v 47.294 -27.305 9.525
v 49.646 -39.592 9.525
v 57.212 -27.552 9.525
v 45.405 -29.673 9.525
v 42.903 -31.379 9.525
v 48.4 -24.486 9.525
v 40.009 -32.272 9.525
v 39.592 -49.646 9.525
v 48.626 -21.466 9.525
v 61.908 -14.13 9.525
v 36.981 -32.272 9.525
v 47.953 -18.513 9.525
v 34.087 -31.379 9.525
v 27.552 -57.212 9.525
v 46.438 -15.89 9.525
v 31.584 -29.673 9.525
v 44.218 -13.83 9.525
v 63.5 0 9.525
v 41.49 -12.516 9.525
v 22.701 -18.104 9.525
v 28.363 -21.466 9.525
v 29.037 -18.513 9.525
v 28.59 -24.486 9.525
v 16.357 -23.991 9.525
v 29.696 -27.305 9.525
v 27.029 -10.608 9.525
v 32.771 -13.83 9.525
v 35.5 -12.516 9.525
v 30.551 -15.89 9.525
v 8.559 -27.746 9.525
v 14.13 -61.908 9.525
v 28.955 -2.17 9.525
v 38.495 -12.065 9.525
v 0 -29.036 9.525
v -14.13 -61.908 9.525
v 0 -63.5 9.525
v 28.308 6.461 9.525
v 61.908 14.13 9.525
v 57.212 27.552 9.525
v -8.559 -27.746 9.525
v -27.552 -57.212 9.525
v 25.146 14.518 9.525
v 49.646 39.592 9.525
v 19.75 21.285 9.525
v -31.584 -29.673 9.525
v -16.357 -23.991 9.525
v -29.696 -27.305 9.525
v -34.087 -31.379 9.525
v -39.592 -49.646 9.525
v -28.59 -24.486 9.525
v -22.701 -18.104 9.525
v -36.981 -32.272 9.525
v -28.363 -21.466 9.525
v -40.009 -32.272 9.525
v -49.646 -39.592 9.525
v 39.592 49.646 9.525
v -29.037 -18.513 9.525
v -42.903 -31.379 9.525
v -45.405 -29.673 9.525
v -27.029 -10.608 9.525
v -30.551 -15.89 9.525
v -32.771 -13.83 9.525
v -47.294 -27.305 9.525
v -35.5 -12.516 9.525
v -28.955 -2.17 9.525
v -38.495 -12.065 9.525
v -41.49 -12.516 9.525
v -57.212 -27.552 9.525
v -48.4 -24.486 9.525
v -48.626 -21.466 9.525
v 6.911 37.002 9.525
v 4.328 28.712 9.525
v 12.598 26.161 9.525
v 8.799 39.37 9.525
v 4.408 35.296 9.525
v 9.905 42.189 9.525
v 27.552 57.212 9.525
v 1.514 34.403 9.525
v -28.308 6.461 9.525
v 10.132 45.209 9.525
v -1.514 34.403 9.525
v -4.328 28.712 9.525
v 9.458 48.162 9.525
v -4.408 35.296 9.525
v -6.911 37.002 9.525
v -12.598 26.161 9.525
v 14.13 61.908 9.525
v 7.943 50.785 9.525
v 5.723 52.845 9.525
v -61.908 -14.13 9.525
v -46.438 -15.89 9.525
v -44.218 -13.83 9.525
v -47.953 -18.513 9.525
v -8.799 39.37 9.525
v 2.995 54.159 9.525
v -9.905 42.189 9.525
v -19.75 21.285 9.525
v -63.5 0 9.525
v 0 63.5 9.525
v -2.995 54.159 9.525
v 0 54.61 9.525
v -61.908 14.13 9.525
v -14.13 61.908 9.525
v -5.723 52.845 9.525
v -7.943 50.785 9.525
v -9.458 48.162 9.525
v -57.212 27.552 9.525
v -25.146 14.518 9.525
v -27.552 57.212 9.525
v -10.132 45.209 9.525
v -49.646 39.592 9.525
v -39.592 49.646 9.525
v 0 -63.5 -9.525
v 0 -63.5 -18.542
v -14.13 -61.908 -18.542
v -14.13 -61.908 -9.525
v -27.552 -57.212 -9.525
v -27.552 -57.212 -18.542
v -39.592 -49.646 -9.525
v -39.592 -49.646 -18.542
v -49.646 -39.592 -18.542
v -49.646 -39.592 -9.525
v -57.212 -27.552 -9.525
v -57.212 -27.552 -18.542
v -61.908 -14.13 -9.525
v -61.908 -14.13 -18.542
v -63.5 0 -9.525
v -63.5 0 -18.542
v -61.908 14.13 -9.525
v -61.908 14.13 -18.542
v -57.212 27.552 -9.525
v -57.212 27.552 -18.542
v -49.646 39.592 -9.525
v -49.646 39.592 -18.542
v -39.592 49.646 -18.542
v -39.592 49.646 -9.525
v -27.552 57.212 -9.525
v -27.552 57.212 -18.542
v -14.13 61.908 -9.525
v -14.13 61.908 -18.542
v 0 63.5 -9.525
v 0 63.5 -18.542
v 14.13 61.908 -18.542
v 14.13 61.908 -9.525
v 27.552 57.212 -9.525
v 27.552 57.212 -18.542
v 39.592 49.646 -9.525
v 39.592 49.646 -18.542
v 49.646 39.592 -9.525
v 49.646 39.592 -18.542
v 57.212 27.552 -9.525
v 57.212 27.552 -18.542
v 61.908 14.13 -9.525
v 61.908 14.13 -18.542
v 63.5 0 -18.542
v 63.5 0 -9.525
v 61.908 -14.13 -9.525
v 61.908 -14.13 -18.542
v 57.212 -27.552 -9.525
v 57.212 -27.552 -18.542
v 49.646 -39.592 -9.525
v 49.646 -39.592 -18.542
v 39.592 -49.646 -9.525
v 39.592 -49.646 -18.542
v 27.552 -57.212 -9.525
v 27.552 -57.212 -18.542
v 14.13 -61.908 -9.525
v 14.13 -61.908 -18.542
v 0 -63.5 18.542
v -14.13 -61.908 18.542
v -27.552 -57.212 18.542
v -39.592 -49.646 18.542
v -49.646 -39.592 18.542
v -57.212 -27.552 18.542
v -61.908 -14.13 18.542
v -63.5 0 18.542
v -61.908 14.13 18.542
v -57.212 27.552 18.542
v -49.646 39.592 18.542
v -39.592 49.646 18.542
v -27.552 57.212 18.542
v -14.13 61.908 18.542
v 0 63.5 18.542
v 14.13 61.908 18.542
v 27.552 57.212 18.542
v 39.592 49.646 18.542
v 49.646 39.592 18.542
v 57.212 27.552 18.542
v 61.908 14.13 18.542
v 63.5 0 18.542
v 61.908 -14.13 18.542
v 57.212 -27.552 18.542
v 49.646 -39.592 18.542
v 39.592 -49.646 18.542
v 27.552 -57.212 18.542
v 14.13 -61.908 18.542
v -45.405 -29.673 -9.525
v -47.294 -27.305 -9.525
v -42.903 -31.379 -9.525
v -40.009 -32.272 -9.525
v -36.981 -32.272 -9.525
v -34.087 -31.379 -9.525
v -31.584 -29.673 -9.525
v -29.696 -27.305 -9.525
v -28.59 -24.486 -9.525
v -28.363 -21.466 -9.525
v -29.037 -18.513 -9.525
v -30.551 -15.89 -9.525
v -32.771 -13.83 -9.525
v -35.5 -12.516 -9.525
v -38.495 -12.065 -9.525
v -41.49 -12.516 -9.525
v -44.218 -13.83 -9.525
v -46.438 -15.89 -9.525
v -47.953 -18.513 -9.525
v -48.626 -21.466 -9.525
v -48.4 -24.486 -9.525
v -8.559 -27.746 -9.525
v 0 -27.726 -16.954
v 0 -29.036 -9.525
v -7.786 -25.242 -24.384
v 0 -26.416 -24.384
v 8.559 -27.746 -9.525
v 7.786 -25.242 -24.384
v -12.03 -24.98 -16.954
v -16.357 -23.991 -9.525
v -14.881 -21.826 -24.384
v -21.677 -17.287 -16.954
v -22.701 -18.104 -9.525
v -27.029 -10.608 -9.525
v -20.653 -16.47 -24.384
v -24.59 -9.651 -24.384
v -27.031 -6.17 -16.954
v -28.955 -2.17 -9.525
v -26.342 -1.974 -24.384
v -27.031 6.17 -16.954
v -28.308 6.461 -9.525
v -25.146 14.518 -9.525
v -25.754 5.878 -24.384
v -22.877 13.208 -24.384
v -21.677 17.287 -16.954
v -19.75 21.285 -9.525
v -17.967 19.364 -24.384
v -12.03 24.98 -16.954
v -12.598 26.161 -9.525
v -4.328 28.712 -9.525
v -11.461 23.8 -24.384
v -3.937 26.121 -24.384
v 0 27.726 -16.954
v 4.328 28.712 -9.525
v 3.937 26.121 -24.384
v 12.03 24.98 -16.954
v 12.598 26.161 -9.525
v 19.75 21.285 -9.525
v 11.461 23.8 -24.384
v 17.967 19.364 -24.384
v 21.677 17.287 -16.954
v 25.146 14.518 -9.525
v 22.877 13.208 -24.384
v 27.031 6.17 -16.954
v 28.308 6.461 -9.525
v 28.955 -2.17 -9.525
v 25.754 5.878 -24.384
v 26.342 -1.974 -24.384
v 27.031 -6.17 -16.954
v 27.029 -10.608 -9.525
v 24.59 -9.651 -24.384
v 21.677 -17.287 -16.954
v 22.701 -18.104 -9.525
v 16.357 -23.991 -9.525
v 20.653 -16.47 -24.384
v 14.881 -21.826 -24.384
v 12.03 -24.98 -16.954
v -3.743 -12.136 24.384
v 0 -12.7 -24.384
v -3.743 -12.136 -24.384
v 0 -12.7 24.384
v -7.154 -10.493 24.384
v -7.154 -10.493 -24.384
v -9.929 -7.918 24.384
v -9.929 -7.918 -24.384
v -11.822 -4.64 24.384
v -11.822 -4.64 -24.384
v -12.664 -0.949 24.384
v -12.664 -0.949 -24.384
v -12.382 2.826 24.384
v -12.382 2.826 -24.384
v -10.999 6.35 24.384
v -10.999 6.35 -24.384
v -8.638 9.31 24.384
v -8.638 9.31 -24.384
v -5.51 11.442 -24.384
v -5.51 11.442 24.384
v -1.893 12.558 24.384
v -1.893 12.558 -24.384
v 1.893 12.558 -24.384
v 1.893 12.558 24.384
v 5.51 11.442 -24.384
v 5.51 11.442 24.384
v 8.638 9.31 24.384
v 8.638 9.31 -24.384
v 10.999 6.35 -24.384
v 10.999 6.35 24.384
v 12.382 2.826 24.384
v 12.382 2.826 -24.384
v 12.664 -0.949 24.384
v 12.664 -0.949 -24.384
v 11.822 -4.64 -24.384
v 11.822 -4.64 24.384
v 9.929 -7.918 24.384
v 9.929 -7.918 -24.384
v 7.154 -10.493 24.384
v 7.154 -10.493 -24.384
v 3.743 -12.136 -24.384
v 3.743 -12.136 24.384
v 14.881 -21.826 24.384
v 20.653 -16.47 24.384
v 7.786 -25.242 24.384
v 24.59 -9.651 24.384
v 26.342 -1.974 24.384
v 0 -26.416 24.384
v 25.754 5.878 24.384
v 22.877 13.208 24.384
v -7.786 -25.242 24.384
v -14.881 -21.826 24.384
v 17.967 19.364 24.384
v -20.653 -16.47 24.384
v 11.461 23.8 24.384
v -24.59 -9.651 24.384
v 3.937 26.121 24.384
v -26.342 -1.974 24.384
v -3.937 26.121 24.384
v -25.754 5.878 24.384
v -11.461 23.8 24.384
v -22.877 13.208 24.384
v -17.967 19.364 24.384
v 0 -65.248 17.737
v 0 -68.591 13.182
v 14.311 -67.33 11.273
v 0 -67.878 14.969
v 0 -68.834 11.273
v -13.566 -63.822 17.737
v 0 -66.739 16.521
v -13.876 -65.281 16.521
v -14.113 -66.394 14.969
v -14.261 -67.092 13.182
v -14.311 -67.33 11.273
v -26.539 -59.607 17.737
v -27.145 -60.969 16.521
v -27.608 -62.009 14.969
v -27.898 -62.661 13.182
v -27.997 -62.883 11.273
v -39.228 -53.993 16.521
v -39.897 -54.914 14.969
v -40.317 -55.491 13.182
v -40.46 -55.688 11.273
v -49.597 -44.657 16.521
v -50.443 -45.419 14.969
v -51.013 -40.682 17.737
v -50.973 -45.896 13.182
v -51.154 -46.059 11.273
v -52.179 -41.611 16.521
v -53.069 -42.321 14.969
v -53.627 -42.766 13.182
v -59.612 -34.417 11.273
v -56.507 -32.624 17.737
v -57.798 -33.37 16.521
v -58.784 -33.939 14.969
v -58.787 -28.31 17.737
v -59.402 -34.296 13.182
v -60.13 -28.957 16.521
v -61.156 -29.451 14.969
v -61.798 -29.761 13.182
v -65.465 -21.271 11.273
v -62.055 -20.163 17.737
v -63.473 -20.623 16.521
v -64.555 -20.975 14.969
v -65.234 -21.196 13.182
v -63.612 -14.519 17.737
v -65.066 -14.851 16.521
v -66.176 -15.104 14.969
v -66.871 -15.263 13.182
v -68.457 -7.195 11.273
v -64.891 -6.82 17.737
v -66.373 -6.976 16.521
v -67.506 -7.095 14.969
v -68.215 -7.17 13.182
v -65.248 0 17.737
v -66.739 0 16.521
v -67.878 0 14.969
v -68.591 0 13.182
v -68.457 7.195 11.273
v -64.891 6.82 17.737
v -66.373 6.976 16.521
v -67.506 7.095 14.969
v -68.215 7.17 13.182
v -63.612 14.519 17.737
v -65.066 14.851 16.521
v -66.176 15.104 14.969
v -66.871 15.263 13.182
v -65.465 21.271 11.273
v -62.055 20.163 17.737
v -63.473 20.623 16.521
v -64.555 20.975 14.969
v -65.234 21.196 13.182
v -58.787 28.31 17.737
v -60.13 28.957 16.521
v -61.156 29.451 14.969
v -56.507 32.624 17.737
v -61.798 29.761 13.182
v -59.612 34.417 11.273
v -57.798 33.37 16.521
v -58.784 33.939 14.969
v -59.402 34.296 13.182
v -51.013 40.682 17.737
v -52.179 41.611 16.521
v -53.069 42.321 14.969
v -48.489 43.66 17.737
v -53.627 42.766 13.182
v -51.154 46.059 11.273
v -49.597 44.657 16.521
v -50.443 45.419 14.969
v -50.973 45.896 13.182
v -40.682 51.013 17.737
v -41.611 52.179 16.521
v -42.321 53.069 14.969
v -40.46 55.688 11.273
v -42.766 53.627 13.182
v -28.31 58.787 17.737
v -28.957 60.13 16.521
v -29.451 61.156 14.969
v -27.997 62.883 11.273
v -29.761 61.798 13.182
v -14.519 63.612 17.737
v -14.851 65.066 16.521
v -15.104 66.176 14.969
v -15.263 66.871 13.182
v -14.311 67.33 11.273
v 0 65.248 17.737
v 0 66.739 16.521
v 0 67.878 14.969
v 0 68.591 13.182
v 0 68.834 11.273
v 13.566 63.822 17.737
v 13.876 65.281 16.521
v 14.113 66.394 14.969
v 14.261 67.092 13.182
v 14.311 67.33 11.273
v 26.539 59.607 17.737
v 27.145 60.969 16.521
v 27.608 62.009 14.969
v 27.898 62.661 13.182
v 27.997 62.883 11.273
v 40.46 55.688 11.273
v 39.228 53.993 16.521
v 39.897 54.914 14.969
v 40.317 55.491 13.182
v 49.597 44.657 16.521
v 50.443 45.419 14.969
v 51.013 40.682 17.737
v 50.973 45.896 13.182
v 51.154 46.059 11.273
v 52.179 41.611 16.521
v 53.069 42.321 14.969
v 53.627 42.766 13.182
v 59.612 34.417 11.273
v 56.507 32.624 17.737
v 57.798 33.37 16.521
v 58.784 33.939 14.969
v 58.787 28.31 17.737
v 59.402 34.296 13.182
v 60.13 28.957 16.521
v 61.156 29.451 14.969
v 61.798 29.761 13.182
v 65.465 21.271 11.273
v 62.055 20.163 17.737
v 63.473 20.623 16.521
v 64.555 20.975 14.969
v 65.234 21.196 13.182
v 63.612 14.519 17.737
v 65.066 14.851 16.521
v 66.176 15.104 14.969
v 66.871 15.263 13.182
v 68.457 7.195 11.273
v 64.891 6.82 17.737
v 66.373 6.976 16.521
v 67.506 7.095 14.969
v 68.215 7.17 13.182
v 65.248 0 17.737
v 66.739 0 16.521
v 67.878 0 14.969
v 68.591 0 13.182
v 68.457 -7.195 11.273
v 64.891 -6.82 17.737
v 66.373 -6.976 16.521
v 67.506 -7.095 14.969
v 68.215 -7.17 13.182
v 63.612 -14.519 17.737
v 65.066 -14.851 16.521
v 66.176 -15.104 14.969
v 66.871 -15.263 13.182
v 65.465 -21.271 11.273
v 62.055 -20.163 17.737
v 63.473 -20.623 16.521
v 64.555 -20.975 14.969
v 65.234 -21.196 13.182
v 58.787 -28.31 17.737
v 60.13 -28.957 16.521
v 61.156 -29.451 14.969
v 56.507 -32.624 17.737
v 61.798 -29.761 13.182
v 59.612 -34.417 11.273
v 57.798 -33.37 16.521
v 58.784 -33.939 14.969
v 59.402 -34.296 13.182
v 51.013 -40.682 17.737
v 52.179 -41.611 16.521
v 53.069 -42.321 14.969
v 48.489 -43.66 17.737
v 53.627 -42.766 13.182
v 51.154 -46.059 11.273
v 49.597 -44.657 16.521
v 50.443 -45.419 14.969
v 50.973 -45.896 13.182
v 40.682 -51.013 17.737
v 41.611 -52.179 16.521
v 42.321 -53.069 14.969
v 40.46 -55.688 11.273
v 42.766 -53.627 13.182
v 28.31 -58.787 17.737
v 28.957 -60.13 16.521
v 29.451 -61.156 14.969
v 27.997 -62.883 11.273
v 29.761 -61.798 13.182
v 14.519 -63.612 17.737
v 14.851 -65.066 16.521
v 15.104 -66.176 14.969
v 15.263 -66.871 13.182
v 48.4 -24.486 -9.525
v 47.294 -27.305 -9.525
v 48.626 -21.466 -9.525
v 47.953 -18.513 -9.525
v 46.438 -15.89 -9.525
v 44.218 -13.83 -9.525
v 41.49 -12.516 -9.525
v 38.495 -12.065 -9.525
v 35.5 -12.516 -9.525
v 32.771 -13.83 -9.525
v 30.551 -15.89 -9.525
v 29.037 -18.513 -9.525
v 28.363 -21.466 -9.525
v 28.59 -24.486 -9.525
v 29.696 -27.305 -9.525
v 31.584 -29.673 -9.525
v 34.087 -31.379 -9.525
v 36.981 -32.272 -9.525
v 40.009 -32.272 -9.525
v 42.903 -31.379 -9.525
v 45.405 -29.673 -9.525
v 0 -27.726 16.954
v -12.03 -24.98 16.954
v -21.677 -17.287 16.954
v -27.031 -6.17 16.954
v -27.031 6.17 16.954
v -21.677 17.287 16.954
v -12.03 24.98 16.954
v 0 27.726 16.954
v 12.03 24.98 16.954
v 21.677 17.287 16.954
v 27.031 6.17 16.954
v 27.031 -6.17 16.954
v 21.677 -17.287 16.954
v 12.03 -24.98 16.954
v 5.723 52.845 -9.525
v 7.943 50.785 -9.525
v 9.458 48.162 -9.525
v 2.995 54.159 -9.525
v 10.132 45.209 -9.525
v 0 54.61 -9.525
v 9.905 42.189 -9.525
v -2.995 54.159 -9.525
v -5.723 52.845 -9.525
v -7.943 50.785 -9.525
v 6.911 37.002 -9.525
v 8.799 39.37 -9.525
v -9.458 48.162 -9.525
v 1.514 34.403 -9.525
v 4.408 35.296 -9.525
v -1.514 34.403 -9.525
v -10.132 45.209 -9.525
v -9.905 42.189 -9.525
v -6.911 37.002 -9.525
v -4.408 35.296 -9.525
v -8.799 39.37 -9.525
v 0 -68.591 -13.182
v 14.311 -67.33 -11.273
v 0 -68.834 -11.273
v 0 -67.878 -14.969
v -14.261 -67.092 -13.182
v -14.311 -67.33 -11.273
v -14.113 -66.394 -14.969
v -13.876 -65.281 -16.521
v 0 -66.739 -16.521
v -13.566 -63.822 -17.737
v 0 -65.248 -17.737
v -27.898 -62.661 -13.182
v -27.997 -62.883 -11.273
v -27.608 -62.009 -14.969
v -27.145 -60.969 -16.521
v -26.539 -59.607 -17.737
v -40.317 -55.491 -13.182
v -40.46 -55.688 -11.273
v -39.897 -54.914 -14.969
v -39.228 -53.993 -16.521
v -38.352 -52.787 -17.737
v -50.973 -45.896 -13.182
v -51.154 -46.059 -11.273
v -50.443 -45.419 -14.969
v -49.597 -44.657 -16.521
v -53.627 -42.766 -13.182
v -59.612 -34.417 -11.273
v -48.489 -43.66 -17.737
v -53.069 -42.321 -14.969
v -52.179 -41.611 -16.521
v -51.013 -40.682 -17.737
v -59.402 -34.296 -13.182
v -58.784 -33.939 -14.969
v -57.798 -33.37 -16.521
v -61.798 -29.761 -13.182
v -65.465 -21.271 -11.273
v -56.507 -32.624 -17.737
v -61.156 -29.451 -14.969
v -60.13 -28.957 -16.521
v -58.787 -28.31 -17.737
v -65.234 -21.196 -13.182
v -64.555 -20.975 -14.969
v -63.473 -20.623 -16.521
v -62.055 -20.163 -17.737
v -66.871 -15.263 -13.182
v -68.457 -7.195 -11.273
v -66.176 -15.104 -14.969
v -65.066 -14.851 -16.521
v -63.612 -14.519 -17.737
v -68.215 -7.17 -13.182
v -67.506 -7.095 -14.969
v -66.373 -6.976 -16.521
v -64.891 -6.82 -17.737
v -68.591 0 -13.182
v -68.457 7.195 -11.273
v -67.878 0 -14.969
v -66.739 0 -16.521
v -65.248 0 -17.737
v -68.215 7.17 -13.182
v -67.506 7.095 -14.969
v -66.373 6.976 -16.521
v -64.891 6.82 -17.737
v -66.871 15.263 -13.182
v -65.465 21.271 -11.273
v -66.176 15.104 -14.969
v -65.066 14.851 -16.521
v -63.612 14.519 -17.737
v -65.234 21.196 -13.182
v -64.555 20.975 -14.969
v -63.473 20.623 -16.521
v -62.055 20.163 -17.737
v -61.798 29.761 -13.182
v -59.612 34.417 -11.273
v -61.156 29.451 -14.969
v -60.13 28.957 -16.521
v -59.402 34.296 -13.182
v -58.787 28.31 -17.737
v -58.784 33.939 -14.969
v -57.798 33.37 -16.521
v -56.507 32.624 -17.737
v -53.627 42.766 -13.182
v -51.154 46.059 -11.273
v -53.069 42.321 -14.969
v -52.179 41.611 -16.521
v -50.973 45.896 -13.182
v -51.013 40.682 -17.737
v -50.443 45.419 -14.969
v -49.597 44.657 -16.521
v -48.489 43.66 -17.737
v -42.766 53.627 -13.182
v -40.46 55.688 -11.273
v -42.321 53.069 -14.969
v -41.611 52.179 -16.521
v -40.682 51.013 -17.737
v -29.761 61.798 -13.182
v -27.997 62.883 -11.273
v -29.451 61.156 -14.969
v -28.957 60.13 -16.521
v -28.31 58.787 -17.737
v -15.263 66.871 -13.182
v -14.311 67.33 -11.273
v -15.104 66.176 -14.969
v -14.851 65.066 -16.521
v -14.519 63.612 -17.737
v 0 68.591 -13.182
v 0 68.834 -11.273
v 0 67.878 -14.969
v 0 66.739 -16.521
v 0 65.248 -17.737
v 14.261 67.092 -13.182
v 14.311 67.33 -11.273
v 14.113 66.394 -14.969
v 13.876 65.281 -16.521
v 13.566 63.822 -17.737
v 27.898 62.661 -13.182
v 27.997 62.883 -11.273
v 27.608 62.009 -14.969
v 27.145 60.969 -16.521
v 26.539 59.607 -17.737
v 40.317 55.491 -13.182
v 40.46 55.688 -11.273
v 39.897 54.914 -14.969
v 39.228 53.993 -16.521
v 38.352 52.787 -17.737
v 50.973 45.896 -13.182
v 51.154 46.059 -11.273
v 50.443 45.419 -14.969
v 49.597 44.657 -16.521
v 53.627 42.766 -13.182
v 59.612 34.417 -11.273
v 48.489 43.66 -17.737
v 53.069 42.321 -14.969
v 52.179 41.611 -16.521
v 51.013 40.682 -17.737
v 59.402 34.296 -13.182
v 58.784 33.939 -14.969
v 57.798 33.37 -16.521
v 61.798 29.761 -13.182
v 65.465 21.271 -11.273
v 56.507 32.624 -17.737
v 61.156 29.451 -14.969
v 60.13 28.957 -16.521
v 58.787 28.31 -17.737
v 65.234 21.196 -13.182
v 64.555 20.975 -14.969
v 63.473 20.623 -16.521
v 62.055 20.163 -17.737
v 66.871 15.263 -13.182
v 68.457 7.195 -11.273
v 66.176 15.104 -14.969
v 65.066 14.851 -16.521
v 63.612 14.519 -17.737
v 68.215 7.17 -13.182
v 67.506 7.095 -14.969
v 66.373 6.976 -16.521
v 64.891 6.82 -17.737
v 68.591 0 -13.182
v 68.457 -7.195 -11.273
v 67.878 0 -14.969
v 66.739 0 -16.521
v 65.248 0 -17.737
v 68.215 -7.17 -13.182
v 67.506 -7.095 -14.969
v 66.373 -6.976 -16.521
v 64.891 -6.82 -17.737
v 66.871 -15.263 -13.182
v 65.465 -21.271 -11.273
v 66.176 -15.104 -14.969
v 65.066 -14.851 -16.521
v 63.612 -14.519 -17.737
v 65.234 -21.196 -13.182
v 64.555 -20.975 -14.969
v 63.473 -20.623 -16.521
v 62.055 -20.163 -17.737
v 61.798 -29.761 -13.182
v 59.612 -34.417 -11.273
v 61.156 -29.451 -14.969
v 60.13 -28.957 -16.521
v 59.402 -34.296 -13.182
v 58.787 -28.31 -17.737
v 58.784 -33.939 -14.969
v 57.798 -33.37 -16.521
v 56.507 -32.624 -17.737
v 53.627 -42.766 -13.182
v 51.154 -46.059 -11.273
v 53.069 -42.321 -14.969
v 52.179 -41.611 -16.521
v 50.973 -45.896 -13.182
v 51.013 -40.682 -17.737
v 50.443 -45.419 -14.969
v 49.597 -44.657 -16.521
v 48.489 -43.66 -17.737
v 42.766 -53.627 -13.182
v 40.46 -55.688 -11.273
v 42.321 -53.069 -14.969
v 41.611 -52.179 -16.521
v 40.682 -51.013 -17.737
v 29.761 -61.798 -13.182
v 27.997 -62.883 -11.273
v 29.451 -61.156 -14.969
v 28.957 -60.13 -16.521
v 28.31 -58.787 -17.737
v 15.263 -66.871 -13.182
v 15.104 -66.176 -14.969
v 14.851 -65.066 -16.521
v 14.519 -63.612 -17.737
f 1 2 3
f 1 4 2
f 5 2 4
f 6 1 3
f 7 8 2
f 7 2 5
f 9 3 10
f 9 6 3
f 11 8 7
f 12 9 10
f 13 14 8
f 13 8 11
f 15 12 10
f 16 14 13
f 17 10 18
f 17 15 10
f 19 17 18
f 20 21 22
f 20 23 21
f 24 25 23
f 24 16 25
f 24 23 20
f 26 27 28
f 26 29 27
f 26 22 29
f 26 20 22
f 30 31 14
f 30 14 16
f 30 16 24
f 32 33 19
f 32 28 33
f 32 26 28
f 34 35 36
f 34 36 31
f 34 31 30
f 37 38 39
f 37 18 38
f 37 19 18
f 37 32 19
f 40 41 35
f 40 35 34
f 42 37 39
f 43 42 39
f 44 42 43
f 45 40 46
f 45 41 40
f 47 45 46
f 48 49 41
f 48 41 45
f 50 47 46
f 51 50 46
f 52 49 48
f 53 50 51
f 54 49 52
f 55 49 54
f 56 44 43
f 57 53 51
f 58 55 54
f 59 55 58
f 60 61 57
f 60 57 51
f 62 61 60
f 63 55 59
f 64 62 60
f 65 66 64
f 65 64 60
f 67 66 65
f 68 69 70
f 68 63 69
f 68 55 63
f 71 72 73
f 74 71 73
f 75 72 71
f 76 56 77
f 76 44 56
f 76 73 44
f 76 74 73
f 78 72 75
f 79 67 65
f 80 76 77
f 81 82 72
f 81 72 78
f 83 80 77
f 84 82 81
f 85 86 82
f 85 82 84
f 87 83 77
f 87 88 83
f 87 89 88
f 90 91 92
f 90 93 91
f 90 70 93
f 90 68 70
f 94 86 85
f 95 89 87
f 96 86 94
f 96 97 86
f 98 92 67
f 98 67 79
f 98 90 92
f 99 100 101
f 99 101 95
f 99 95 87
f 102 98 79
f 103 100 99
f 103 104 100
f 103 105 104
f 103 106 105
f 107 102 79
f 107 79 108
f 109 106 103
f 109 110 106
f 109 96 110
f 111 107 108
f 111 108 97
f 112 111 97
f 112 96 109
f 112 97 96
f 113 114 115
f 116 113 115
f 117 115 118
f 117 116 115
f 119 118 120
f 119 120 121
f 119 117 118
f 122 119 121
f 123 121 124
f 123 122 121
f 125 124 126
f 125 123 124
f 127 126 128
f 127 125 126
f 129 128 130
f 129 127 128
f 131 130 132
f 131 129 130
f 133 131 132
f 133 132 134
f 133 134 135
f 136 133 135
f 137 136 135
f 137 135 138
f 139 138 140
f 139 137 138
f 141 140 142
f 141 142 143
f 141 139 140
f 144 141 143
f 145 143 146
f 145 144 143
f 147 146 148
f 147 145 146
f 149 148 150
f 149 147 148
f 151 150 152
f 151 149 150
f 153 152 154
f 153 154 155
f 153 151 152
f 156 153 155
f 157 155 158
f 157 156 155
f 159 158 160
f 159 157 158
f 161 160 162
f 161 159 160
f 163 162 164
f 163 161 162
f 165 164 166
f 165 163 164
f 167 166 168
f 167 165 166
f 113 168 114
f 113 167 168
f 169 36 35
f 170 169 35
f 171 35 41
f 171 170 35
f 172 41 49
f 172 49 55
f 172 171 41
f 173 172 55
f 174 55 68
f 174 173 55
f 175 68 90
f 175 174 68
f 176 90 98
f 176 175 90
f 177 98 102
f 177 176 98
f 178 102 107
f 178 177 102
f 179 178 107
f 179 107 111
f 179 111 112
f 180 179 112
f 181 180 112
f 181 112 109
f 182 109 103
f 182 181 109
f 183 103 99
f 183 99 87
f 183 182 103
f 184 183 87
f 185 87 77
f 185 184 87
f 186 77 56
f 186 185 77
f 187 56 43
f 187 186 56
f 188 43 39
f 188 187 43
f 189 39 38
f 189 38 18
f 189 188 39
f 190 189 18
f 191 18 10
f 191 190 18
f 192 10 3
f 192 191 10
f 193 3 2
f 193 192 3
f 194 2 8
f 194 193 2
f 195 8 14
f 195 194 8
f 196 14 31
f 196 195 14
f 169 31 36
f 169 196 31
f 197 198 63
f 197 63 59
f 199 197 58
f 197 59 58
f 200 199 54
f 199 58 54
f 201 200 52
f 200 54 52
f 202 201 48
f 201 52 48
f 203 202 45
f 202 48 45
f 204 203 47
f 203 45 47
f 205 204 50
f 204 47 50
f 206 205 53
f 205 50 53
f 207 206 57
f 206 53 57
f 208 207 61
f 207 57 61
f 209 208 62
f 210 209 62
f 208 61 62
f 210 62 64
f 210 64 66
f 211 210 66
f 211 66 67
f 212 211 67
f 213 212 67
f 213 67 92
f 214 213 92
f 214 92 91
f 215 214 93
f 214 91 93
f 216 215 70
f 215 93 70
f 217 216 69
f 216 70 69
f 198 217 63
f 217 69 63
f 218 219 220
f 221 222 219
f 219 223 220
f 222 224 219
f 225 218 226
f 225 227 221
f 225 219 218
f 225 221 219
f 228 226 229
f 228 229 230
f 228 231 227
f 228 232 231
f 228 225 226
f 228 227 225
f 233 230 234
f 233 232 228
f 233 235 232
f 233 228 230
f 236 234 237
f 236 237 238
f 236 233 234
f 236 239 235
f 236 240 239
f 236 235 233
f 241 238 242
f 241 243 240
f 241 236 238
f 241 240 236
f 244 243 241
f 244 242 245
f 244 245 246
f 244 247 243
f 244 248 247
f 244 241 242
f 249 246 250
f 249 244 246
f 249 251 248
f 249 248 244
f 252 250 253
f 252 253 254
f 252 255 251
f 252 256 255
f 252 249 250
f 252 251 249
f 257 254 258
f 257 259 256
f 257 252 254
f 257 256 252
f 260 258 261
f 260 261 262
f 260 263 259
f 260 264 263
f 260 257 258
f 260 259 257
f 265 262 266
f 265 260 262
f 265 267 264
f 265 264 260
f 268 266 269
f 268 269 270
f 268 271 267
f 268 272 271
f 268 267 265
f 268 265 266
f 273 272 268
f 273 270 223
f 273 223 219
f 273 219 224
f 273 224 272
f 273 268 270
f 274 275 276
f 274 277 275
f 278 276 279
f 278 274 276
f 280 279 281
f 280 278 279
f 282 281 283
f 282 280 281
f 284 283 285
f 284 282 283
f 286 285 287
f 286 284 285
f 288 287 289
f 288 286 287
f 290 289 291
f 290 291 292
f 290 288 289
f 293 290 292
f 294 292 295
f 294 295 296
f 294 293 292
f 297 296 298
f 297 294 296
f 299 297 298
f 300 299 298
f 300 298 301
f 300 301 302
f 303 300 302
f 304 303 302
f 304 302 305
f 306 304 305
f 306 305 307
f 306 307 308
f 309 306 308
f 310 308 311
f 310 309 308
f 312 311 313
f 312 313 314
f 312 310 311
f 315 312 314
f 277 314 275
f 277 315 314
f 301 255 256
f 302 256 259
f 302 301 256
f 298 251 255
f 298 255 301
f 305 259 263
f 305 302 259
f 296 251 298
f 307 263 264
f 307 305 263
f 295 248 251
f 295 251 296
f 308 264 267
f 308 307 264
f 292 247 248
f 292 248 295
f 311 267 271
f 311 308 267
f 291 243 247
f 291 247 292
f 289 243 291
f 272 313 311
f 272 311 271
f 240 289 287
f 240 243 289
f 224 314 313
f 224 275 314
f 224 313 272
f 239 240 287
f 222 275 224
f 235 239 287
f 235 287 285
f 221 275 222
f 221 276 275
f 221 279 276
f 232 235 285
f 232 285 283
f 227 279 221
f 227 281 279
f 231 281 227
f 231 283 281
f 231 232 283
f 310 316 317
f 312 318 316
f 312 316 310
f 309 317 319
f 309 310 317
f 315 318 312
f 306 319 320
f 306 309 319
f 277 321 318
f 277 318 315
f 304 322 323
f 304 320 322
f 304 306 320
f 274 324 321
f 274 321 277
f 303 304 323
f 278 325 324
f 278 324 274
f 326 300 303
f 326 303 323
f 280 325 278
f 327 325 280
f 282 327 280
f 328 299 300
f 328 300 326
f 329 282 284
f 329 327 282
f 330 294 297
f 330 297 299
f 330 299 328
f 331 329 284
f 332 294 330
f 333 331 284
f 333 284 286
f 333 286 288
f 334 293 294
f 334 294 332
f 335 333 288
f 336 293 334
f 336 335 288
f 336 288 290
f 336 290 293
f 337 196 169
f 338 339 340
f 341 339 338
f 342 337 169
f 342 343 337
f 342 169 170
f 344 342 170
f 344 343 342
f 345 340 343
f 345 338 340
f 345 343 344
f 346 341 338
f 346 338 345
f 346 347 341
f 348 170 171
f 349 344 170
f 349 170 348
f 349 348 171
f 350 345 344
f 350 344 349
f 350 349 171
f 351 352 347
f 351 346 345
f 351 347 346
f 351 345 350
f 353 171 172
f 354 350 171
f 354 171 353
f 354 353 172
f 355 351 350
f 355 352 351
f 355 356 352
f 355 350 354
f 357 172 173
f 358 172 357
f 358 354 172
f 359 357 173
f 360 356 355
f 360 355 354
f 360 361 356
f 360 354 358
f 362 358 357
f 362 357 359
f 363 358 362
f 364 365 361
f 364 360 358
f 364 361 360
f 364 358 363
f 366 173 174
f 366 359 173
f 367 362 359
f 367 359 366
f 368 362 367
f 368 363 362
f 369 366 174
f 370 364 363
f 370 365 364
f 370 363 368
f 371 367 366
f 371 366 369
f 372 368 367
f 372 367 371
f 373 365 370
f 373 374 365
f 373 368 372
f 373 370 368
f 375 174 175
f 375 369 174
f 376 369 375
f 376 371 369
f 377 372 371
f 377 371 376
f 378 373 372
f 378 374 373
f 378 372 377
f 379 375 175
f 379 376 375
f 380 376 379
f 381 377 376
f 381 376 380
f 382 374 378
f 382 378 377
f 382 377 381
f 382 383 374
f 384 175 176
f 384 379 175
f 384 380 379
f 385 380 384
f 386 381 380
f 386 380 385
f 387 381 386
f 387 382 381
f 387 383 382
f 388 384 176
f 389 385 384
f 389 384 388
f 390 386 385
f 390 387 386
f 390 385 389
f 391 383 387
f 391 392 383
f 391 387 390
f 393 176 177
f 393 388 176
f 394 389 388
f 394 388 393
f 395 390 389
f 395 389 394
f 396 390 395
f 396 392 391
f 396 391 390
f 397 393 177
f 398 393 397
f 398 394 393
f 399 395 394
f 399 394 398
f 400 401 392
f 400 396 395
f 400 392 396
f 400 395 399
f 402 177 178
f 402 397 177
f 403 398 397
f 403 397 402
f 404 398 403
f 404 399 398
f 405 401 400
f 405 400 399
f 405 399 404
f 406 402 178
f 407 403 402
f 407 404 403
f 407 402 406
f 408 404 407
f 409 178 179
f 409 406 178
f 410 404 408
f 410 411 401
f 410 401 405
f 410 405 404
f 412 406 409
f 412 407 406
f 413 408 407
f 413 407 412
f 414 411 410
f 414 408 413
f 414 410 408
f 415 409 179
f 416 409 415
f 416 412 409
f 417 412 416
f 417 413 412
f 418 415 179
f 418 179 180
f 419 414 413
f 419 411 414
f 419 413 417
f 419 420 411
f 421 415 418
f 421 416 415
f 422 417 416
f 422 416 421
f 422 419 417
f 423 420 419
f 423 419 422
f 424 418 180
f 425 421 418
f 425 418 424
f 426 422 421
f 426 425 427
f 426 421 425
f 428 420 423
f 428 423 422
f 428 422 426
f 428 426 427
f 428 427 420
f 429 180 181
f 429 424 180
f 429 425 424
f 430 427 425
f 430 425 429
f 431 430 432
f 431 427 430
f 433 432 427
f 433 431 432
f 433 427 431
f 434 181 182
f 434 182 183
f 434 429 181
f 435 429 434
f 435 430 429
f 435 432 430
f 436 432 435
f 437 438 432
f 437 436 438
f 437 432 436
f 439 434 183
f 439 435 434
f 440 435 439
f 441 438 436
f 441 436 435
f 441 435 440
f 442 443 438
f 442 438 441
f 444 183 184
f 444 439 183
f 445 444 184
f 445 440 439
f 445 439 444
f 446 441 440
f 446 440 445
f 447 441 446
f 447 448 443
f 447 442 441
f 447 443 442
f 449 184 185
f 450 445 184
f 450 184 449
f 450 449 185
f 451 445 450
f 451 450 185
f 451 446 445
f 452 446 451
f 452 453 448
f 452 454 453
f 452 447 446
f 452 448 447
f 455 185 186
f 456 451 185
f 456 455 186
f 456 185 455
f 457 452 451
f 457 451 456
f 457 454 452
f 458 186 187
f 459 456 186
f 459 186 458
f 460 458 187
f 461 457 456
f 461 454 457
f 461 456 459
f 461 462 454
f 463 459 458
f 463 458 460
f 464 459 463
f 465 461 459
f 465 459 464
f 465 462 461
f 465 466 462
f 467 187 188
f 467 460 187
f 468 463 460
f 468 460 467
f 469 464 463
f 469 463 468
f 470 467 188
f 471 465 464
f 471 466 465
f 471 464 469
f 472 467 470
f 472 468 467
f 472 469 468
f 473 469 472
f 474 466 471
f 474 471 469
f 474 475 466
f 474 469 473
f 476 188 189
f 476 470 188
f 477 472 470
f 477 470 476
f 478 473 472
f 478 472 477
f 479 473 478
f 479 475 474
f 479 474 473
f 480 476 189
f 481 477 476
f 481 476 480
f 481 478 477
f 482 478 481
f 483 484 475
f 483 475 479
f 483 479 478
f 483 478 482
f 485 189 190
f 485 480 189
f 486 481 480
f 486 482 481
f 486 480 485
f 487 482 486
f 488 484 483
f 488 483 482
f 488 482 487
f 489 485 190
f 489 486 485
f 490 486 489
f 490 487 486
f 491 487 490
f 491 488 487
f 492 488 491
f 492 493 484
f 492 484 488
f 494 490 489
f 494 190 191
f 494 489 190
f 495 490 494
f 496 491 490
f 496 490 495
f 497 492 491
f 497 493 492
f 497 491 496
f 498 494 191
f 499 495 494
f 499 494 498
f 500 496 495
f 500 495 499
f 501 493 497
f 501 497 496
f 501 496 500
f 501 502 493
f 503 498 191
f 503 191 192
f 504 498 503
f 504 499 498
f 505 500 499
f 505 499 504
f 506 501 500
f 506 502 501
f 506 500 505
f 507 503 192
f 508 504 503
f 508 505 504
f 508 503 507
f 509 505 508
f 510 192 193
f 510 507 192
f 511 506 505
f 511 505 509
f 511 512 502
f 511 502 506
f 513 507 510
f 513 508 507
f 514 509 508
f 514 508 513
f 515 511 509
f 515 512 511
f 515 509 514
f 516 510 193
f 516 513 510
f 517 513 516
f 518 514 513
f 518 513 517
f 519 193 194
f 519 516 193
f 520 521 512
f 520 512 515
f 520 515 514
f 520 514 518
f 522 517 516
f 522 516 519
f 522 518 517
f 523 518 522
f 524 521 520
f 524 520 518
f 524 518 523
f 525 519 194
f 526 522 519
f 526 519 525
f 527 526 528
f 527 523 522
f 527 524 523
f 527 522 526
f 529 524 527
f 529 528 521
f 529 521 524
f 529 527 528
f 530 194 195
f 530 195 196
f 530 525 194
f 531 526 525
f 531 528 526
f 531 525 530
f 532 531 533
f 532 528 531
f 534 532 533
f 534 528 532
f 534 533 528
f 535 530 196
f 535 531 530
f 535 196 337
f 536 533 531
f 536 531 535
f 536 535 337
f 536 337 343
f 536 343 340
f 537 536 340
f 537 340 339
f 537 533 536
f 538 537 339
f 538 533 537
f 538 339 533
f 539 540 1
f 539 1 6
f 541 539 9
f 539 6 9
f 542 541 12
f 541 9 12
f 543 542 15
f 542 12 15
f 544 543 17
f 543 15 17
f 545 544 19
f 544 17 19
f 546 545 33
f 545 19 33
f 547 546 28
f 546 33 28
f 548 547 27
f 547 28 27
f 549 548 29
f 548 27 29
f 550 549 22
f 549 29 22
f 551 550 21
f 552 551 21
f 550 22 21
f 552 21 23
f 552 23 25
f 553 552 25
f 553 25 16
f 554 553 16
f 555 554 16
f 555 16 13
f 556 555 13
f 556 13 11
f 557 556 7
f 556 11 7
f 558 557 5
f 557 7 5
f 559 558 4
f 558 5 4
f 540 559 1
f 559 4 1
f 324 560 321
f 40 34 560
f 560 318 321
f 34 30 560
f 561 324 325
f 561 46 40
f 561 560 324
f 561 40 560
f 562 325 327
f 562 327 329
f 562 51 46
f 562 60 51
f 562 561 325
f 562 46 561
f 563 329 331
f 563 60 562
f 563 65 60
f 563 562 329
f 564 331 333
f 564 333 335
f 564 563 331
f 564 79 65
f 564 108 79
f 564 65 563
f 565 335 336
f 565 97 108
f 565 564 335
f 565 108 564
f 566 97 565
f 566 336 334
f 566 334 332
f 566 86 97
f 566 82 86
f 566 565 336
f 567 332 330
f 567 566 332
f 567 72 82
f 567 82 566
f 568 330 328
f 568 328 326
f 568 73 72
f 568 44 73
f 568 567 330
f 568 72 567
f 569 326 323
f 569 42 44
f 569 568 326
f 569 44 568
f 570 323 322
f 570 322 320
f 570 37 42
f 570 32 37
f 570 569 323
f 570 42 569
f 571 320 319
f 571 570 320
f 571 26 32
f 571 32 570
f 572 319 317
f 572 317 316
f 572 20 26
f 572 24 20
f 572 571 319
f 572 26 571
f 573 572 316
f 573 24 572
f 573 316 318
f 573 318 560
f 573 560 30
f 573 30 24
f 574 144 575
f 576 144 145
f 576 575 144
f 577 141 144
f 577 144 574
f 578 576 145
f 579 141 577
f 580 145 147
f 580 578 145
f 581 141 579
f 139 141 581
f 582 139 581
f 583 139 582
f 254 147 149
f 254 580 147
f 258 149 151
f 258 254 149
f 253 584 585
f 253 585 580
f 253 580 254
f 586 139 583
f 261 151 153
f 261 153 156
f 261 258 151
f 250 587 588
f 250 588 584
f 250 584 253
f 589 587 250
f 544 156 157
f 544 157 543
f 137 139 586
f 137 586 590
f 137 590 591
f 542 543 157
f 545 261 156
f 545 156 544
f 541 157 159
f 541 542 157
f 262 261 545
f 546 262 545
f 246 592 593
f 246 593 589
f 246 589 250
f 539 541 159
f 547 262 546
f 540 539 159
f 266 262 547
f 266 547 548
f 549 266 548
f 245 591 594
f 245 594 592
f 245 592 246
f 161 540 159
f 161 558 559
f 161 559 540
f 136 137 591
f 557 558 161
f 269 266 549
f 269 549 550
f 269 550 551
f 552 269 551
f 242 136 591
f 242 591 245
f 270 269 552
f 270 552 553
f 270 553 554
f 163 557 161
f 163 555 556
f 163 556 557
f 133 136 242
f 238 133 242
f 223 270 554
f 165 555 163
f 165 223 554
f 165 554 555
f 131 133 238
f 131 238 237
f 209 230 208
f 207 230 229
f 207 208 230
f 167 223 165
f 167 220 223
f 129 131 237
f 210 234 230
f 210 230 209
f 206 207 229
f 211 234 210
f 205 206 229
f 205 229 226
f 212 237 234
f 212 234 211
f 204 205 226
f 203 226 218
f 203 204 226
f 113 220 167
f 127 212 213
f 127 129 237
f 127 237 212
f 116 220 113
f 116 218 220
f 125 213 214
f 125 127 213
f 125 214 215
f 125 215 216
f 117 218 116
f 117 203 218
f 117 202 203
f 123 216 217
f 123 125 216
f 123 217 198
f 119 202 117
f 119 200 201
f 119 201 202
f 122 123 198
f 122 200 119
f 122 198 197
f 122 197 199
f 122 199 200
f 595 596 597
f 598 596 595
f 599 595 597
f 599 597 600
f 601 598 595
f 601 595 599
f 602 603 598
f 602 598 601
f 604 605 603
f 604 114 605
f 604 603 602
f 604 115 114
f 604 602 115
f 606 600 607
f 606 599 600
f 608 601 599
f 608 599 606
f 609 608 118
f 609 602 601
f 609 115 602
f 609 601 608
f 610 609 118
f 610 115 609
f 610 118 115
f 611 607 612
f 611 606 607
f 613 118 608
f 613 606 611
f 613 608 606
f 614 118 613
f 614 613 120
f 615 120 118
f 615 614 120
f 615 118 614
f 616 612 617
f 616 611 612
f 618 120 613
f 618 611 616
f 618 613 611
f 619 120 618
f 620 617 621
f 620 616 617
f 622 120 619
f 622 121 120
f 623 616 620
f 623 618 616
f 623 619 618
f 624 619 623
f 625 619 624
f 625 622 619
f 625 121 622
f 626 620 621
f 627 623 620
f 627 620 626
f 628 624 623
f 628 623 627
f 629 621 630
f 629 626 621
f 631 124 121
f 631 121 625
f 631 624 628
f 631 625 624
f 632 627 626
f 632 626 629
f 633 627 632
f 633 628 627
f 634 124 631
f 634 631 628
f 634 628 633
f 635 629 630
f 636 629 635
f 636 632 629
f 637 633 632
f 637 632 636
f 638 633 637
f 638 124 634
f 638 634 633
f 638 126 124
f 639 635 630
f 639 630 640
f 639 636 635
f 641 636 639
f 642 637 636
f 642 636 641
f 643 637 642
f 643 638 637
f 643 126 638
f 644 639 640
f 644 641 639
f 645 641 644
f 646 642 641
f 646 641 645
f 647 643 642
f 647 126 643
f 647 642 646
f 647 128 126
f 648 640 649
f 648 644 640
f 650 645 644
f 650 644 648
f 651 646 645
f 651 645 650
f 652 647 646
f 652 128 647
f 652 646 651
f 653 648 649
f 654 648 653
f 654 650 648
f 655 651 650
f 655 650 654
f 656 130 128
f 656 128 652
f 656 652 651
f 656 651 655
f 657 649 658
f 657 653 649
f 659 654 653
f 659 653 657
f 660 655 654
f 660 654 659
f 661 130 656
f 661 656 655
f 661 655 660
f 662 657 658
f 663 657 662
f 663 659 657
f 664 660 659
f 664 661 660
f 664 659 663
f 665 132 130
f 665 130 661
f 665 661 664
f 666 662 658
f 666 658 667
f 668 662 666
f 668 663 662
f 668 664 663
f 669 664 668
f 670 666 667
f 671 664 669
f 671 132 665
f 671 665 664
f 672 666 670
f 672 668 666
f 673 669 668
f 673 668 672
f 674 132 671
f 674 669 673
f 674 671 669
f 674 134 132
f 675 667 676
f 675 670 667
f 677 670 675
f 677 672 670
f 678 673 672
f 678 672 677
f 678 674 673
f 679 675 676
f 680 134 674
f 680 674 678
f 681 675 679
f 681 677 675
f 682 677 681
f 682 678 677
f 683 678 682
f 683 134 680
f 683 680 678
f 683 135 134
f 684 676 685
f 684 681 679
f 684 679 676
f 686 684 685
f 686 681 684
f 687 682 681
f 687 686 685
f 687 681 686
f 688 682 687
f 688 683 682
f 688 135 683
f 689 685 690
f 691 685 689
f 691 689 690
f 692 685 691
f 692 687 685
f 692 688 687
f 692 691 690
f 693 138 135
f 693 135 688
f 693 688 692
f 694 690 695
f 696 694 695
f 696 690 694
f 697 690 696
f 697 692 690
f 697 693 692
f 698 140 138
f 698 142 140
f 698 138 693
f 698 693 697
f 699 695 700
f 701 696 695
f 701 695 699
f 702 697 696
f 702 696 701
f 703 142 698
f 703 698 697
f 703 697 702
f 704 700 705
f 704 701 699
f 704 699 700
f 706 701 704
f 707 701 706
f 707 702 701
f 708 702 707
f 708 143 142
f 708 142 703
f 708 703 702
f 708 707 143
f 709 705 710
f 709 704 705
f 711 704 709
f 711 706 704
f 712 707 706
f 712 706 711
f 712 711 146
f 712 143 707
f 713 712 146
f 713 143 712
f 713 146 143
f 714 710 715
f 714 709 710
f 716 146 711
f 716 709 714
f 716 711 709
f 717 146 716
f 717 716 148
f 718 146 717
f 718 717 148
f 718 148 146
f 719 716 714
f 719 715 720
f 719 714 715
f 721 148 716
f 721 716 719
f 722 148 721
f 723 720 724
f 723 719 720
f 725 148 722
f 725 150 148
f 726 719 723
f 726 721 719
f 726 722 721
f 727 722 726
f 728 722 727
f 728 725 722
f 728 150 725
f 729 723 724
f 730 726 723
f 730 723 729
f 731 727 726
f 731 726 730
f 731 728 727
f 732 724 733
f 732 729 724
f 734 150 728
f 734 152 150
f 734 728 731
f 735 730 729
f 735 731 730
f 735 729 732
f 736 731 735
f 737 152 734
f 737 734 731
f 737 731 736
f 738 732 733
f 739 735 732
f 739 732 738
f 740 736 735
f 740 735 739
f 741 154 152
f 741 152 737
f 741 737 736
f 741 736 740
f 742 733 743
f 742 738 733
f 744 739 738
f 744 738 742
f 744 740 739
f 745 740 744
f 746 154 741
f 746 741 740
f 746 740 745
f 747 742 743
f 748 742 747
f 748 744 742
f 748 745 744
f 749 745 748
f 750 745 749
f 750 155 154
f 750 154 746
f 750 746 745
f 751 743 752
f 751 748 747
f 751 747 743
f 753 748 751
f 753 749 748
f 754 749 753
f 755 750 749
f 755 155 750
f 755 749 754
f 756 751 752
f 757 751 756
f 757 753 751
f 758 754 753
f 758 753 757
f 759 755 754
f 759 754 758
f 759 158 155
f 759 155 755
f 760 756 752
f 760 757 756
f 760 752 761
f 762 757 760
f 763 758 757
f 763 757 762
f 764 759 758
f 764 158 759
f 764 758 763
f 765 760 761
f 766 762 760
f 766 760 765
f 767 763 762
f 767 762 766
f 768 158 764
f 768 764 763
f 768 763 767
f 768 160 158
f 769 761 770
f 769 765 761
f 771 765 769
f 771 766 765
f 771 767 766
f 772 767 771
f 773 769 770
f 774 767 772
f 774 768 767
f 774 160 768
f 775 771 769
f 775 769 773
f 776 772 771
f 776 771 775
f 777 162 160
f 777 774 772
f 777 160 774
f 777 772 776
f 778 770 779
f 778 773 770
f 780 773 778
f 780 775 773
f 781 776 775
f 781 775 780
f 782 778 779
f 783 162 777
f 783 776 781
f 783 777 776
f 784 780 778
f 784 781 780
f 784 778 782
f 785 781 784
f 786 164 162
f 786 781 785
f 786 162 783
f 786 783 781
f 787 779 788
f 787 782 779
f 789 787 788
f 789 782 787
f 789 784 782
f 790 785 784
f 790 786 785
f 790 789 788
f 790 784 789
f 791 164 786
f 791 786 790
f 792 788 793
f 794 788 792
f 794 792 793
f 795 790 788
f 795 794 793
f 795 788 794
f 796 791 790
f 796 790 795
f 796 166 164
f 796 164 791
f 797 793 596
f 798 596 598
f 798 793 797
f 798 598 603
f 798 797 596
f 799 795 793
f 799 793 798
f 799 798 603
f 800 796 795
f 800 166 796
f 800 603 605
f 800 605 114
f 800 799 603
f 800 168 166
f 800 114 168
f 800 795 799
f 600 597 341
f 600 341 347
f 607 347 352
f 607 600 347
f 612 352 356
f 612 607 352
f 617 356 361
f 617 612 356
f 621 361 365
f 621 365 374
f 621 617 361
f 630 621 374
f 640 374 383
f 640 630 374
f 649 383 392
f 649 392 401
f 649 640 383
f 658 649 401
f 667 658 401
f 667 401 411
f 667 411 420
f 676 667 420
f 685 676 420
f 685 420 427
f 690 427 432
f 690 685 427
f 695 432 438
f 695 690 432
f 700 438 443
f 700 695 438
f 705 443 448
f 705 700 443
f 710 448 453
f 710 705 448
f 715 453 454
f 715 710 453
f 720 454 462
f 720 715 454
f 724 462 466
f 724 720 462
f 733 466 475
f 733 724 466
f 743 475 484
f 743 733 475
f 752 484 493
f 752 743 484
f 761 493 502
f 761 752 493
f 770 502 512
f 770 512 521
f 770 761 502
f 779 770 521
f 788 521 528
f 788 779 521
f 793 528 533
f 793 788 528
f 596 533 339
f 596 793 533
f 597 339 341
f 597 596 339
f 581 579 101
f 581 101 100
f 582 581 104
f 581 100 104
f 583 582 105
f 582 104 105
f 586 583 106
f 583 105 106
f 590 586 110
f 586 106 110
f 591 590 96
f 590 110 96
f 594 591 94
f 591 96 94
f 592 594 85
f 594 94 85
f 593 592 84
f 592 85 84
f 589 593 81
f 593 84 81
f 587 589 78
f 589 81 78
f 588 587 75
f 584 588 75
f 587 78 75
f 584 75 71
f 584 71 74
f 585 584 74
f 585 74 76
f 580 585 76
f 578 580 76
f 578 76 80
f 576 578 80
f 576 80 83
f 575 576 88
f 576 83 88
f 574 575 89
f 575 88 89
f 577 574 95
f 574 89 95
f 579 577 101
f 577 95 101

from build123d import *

# Parameters (mm, degrees)
SKETCH2_R          = 10.16
CUT_EXTRUDE2_DEPTH = 254
CIRPATTERN1_COUNT  = 3
FILLET1_R          = 7.62


with BuildPart() as part:
    # Sketch1 → Revolve1 (revolve)
    with BuildSketch(Plane(origin=(0, 0, 0), x_dir=(0, 0, -1), z_dir=(1, 0, 0)), mode=Mode.PRIVATE) as revolve1_sk:
        Polygon((-24.384, 12.7), (-24.384, 26.416), (-9.525, 29.036042606), (-9.525, 63.5), (-18.542, 63.5), (-18.542, 68.834), (18.542, 68.834), (18.542, 63.5), (9.525, 63.5), (9.525, 29.036042606), (24.384, 26.416), (24.384, 12.7), align=None)
    revolve(revolve1_sk.sketch.rotate(Axis((0, 0, 0), (0, 0, -1)), 180), axis=Axis((0, 0, 0), (0, 0, -1)))

    # Sketch2 → Cut-Extrude2 (cut, symmetric)
    with BuildSketch(Plane.XY):
        with Locations(Location((0, 44.45, 0), (0, 0, 90))):
            Circle(SKETCH2_R)
    cut_extrude2 = extrude(amount=CUT_EXTRUDE2_DEPTH, both=True, mode=Mode.SUBTRACT)

    # CirPattern1: Cut-Extrude2 ×3 about axis
    cirpattern1_axis = Axis((0, 0, 0), (0, 0, 1))
    for i in range(1, CIRPATTERN1_COUNT):
        add(cut_extrude2.rotate(cirpattern1_axis, i * 360 / CIRPATTERN1_COUNT), mode=Mode.SUBTRACT)

    # Fillet1
    # the kernel refuses this fillet: 7.62 mm, written as the material it takes off along each edge
    with BuildSketch(Plane(origin=(0, 0, 18.542), x_dir=(0, -1, 0), z_dir=(1, 0, 0))) as fillet1_piece_1:
        with BuildLine():
            CenterArc((61.214, 7.269016715), FILLET1_R, 287.457603124, 72.542396876)
            Line((68.834, 7.269016715), (68.9864, 7.269016715))
            Line((68.9864, 7.269016715), (68.9864, 0))
            Line((68.9864, 0), (68.834, -0.1524))
            ThreePointArc((68.834, -0.1524), (66.167, -0.1524), (63.54572, -0.145380334))
            Line((63.54572, -0.145380334), (63.5, 0))
        make_face()
    revolve(axis=Axis((0, 0, 18.542), (0, 0, -1)), mode=Mode.SUBTRACT)
    with BuildSketch(Plane(origin=(0, 0, -18.542), x_dir=(0, -1, 0), z_dir=(1, 0, 0))) as fillet1_piece_2:
        with BuildLine():
            CenterArc((61.214, -7.269016715), FILLET1_R, 0, 72.542396876)
            Line((63.5, 0), (63.54572, 0.145380334))
            ThreePointArc((63.54572, 0.145380334), (66.167, 0.1524), (68.834, 0.1524))
            Line((68.834, 0.1524), (68.9864, 0))
            Line((68.9864, 0), (68.9864, -7.269016715))
            Line((68.9864, -7.269016715), (68.834, -7.269016715))
        make_face()
    revolve(axis=Axis((0, 0, -18.542), (0, 0, -1)), mode=Mode.SUBTRACT)


solid = part.part
